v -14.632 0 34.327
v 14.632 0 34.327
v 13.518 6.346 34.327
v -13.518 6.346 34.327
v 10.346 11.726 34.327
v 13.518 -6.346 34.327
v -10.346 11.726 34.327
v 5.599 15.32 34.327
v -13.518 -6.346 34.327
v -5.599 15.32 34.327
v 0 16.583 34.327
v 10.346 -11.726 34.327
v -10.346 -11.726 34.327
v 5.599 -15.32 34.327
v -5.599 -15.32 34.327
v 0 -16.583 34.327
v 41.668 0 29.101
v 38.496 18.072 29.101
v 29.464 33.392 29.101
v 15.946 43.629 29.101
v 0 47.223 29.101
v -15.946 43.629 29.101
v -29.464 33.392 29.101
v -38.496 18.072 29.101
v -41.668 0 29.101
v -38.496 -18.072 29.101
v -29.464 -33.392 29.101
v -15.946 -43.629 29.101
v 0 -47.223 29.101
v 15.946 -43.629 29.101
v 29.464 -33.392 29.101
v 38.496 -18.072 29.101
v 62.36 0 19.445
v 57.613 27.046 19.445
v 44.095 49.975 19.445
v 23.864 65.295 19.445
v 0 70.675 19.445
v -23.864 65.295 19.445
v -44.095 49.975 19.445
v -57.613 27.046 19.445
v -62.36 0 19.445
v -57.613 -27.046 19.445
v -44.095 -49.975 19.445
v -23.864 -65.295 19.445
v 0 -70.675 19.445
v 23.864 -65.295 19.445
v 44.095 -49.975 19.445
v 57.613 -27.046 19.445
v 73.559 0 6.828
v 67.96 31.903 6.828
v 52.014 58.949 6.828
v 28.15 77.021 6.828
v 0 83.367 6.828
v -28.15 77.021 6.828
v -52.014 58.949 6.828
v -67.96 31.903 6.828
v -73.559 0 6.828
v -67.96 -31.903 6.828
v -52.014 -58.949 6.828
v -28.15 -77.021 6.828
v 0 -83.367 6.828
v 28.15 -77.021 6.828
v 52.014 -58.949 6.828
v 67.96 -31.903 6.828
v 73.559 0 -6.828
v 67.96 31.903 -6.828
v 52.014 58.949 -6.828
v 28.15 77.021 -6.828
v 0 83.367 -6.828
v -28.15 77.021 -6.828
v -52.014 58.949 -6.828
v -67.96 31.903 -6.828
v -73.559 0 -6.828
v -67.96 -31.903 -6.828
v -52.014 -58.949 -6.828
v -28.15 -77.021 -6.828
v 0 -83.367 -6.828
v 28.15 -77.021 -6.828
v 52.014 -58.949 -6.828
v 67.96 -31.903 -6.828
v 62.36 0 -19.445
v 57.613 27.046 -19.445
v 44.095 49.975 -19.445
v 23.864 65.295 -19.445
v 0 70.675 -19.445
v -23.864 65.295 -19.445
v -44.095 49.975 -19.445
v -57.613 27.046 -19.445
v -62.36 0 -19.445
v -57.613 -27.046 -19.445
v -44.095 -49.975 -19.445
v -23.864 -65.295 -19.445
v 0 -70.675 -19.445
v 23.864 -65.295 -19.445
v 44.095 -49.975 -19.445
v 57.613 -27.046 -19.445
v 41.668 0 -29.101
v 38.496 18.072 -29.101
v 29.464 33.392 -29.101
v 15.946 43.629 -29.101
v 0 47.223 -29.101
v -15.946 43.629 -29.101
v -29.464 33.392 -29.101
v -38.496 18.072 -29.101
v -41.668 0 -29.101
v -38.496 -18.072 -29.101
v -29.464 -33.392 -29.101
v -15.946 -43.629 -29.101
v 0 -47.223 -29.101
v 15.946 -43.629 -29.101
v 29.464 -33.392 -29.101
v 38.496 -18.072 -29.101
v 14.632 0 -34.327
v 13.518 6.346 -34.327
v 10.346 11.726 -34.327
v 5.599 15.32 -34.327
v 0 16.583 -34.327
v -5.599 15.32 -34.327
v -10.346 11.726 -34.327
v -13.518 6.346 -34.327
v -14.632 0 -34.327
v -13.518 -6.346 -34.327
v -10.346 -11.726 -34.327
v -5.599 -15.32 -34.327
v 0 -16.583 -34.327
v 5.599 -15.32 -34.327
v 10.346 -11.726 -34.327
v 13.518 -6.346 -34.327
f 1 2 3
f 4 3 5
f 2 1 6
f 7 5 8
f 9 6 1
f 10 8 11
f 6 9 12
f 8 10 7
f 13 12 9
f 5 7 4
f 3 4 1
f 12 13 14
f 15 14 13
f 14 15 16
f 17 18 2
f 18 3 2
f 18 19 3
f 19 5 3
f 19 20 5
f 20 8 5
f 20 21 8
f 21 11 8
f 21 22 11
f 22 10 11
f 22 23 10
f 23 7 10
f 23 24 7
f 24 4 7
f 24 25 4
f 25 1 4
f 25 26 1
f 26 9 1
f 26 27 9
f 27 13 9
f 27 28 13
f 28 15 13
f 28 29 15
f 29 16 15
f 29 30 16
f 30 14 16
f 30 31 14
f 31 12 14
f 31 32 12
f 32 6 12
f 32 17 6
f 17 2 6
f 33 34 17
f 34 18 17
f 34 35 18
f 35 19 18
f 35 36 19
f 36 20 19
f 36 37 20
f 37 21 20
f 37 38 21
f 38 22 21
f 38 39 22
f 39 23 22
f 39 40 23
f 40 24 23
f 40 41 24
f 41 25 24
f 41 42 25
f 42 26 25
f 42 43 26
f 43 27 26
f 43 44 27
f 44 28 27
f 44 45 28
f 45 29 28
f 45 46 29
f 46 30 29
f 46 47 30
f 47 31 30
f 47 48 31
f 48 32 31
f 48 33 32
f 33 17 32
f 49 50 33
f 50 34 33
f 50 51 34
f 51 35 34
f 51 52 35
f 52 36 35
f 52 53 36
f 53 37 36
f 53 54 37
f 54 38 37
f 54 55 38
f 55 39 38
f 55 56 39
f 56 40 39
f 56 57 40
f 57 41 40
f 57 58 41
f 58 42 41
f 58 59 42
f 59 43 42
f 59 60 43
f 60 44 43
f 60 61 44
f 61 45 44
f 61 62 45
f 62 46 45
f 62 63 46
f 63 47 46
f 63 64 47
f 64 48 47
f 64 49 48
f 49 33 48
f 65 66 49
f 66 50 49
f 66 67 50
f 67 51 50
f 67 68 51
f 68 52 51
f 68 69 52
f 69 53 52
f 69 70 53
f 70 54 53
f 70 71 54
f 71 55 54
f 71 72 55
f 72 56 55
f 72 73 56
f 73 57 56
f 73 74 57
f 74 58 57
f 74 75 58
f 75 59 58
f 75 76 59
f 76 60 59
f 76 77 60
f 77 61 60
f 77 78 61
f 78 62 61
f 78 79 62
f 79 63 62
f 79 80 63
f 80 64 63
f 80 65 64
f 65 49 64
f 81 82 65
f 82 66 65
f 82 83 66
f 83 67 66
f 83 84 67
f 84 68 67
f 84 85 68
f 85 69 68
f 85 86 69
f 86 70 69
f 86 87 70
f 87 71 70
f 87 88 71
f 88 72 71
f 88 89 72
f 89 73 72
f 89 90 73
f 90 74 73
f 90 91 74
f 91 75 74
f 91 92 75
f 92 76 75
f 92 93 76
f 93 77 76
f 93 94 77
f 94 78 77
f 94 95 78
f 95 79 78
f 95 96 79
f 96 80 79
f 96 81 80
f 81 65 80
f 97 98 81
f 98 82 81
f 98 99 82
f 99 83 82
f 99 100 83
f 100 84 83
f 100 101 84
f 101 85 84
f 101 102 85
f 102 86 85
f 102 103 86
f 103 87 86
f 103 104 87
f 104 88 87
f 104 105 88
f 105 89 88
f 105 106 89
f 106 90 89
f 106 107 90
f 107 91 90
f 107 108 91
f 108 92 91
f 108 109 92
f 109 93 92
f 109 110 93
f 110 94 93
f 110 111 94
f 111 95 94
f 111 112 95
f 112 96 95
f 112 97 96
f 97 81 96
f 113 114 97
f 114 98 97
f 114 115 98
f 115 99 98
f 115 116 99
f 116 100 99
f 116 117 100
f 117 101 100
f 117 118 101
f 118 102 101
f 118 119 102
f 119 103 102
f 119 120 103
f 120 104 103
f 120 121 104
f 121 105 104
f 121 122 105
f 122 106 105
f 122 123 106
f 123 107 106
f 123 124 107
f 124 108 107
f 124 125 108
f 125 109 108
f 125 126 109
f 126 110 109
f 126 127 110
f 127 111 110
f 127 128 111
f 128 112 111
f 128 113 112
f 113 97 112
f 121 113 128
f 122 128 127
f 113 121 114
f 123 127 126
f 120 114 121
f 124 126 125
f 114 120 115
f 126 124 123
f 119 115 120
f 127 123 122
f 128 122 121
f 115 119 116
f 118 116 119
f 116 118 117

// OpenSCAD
// Generated by SolidPython 1.0.1 on 2020-07-29 00:46:52


scale(v = [15, 17, 7]) {
	sphere(r = 5);
}
/***********************************************
*********      SolidPython code:      **********
************************************************
 
# import packages: SolidPython
from solid import *
from solid.utils import *
from itertools import chain, combinations, permutations


class Resize:

    def __init__(self, scad_file):
        self.scad_file = scad_file
        #self.scad_file = import_scad(scad_file)
        # cone/cylinder param:
        self.r1 = 0
        self.r2 = 0
        self.h = 0
        # rectangular prism param:
        self.w = 0
        self.l = 0
        # ellipse param:
        self.r = 0

    # import OpenScad code (file name corresponds to shape)


    # classify shape + parameters
    def assign(self, param1, param2, param3):
        if self.scad_file == 'cone.scad':
            self.r1 = param1
            self.r2 = param2
            self.h = param3
        elif self.scad_file == 'cylinder.scad':
            self.r1 = param1
            self.r2 = param2
            self.h = param3
        elif self.scad_file == 'rectangularPrism.scad':
            self.h = param1
            self.l = param2
            self.w = param3
        else:
            self.r = param1
            self.h = param2

    # resize parameters
    def iterate(self):
        x = range(3, 20, 2)
        i = 1
        if self.scad_file == 'cone.scad':
            tempList = list(permutations(x, 2))
            for temp in tempList:
                param1 = temp[0]
                param2 = temp[1]
                filepath = 'produced_scad_files/' + 'cone' + str(param1) + '_' + str(param2) + '_' + '.scad'
                scad_render_to_file(cylinder(h=param1, r1=param2, r2=0), filepath)

        elif self.scad_file == 'cylinder.scad':
            tempList = list(permutations(x, 3))
            for temp in tempList:
                param1 = temp[0]
                param2 = temp[1]
                filepath = 'produced_scad_files/' + 'cylinder' + str(param1) + '_' + str(param2) + '_' + '.scad'
                scad_render_to_file(cylinder(h=param1, r1=param2, r2=param2), filepath)

        elif self.scad_file == 'rectangularPrism.scad':
            tempList = list(permutations(x, 3))
            for temp in tempList:
                param1 = temp[0]
                param2 = temp[1]
                param3 = temp[2]
                filepath = 'produced_scad_files/' + 'rectangularPrism' + str(param1) + '_' + str(param2) + '_' + str(
                    param3) + '.scad'
                scad_render_to_file(cube(size=(param1, param2, param3)), filepath)

        elif self.scad_file == 'ellipse.scad':
            tempList = list(permutations(x, 4))
            for temp in tempList:
                param1 = temp[0]
                param2 = temp[1]
                param3 = temp[2]
                param4 = temp[3]
                filepath = 'produced_scad_files/' + 'ellipse' + str(param1) + '_' + str(param2) + '_' + str(param3) + '_' + str(param4) + '.scad'
                scad_render_to_file(scale([param1, param2, param3])(sphere(r=param4)), filepath)

    def render_to_scadfile(self):
        scad_render_to_file(scad, 'example.scad') 
 
************************************************/
